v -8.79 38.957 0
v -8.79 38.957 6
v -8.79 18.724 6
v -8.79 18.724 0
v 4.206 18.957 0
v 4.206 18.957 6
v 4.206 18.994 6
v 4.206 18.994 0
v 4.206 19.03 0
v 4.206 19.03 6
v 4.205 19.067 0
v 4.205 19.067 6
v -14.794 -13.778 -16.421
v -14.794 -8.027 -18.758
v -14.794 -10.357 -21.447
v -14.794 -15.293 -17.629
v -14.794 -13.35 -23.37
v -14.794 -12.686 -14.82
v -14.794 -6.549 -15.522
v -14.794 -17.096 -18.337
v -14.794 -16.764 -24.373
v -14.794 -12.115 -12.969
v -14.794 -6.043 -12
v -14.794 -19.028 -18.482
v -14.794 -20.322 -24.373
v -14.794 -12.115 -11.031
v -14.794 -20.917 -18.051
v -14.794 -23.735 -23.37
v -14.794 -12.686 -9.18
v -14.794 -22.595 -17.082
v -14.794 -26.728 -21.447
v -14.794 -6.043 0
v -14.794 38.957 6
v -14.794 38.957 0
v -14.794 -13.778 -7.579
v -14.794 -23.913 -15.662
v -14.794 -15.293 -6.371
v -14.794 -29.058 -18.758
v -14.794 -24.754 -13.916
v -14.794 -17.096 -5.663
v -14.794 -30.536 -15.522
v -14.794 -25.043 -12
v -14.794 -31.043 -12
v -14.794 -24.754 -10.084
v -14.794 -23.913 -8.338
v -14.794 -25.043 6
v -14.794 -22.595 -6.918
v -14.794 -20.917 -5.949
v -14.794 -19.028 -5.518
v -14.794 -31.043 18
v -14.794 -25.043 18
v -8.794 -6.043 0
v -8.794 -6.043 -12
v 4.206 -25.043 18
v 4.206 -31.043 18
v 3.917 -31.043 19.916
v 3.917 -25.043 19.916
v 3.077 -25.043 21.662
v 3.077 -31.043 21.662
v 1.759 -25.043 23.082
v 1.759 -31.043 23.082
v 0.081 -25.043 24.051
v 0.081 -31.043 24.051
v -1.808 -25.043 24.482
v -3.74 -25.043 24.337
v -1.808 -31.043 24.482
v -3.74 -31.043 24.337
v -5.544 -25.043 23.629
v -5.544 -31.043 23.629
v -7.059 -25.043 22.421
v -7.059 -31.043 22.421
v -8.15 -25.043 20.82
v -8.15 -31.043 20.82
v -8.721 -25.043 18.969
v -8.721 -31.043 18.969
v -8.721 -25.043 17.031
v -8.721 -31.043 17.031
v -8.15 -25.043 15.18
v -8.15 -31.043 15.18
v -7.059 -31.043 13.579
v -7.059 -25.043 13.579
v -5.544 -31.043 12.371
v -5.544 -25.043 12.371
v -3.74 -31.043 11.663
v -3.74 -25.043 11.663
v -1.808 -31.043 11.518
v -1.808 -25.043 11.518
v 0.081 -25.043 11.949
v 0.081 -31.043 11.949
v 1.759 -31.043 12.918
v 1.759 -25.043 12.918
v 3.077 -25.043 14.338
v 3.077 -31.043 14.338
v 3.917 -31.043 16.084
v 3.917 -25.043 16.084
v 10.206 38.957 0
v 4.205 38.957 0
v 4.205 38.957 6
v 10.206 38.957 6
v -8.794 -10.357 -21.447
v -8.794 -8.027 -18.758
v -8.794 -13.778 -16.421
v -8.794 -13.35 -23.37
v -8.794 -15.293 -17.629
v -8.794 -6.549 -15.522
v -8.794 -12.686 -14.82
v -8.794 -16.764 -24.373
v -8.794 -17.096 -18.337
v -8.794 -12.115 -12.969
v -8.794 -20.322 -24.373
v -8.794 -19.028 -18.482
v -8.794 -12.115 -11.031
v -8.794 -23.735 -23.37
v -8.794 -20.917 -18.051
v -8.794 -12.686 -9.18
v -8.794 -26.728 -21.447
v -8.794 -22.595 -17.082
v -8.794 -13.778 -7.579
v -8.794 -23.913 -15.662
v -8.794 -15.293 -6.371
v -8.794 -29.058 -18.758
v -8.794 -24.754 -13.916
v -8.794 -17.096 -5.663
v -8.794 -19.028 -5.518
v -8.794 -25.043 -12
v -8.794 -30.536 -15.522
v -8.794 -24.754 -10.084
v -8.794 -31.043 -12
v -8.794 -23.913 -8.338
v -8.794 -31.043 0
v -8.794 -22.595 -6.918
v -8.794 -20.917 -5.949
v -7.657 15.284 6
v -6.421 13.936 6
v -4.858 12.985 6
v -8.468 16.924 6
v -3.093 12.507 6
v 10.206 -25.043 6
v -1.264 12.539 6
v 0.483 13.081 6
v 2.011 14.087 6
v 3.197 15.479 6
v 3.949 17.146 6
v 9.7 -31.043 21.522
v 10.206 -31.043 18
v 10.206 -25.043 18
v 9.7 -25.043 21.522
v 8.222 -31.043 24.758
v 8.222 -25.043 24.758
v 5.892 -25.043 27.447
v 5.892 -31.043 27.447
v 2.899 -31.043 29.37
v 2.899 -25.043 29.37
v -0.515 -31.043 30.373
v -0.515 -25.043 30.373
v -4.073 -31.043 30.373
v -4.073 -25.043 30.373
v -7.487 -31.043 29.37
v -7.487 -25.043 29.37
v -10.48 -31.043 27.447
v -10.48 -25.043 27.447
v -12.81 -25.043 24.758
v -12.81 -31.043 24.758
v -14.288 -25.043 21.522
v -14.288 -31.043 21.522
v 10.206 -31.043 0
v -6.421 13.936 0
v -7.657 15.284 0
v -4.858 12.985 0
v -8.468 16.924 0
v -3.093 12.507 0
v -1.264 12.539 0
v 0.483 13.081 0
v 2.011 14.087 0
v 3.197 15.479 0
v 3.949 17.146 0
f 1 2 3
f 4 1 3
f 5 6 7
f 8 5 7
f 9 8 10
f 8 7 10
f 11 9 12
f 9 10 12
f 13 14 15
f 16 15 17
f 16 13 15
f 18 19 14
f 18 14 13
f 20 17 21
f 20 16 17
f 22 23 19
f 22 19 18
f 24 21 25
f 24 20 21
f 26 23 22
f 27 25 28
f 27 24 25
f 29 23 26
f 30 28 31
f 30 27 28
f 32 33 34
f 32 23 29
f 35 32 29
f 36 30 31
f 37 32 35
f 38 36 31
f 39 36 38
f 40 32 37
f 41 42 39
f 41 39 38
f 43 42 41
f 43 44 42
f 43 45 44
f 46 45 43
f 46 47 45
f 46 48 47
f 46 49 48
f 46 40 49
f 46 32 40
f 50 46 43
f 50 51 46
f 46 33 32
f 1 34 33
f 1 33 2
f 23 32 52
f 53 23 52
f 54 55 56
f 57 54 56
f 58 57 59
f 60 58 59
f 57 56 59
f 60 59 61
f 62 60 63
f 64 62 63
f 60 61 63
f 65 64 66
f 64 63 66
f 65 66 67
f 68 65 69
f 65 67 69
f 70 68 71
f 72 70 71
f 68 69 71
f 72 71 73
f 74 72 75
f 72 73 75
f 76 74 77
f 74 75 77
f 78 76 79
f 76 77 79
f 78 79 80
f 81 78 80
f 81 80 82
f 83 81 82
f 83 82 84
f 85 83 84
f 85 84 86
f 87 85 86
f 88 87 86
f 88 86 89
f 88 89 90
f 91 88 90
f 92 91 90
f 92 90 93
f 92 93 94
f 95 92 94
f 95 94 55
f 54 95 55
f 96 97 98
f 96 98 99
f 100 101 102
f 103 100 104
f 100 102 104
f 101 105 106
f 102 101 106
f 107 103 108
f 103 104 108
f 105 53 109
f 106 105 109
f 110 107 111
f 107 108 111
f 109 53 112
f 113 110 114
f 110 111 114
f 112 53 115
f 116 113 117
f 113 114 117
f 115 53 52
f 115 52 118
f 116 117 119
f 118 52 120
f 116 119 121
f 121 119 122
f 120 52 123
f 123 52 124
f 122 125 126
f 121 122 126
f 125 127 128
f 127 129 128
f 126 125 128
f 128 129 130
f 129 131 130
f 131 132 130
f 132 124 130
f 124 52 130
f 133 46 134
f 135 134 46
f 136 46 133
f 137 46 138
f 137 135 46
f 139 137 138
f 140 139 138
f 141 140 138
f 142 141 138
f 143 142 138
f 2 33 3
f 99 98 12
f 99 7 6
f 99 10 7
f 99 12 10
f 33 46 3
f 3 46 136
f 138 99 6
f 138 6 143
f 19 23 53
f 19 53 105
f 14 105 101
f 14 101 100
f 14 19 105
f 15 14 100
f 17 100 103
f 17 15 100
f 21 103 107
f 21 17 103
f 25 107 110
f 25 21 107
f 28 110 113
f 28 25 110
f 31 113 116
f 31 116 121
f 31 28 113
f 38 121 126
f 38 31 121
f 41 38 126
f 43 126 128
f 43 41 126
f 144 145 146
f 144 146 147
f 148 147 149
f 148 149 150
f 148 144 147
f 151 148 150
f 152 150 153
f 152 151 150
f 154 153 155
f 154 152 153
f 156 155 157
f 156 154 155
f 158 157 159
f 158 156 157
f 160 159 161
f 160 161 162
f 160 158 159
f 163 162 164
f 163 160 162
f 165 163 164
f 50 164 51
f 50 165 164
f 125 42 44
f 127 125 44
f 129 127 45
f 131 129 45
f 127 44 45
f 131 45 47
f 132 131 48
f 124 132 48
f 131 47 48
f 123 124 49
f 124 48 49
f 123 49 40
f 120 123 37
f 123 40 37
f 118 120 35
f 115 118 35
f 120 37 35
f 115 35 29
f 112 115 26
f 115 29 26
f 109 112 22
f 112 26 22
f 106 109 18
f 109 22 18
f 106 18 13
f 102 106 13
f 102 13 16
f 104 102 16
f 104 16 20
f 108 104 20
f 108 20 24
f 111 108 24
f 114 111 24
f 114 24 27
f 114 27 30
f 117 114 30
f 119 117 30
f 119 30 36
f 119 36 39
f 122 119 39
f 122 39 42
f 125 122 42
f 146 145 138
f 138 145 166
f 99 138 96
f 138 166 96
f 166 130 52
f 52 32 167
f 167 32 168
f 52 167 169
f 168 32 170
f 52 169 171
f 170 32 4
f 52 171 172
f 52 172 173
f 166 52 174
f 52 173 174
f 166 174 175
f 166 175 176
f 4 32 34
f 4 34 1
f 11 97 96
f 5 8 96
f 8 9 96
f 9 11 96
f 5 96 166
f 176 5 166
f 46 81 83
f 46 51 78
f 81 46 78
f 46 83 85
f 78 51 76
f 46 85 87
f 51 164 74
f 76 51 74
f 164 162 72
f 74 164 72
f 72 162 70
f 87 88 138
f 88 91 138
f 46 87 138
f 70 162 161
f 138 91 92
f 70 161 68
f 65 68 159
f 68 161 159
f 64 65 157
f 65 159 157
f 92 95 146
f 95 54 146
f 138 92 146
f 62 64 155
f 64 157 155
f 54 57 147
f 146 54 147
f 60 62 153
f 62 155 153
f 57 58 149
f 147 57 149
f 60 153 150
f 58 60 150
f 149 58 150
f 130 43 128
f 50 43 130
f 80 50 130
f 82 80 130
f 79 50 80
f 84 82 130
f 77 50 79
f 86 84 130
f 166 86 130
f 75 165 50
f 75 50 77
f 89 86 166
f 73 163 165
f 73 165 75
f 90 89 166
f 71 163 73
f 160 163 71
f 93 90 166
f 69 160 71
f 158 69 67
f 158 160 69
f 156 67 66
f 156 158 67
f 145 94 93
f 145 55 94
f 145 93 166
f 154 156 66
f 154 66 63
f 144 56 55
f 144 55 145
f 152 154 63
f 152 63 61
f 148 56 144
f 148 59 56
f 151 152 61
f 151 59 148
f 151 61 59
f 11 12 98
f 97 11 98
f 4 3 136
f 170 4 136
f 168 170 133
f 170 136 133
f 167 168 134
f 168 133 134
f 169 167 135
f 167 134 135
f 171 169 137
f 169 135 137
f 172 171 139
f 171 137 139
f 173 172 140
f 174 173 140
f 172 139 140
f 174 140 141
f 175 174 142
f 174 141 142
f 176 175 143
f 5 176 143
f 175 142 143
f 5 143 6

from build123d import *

# Parameters (mm, degrees)
F0_W      = 25
F0_H      = 70
F1_DEPTH  = 6
F2_W      = 25
F2_H      = 6
F3_DEPTH  = 12
F5_DEPTH  = 6
F6_R      = 6.5
F7_DEPTH  = 25
F9_DEPTH  = 25
F10_W     = 6
F10_H     = 25
F11_DEPTH = 12
F13_DEPTH = 6
F14_R     = 6.5
F15_DEPTH = 25


with BuildPart() as f1:
    # F0 (on Top) → F1 (new body)
    with BuildSketch(Plane.XY):
        with Locations((-2.293949775, 3.9573735297)):
            Rectangle(F0_W, F0_H)
    extrude(amount=F1_DEPTH)

    # F2 (on face) → F3 (join)
    with BuildSketch(Plane.XY.offset(6)):
        with Locations((-2.293949775, -28.0426264703)):
            Rectangle(F2_W, F2_H)
    extrude(amount=F3_DEPTH)

    # F4 (on face) → F5 (join)
    with BuildSketch(Plane.XZ.offset(31.0426264703)):
        with BuildLine():
            Line((-14.793949775, 18), (10.206050225, 18))
            ThreePointArc((10.206050225, 18), (-2.293949775, 30.5), (-14.793949775, 18))
        make_face()
    extrude(amount=-F5_DEPTH)

    # F6 (on face) → F7 (cut)
    with BuildSketch(Plane.XZ.offset(31.0426264703)):
        with Locations((-2.293949775, 18)):
            Circle(F6_R)
    extrude(amount=-F7_DEPTH, mode=Mode.SUBTRACT)

    # F8 (on face) → F9 (cut)
    with BuildSketch(Plane.XY.offset(6)):
        with BuildLine():
            ThreePointArc((-8.7897636486, 18.7241309105), (-2.1773096843, 12.4584201455), (4.206050225, 18.9573735297))
            ThreePointArc((4.206050225, 18.9573735297), (4.2058200655, 19.0120728966), (4.2051296032, 19.0667683897))
            ThreePointArc((4.2051296032, 19.0667683897), (-2.2320043737, 25.4570783512), (-8.7897636486, 19.1906161489))
            Line((-8.7897636486, 19.1906161489), (-8.7897636486, 18.7241309105))
        make_face()
        with BuildLine():
            ThreePointArc((-8.7897636486, 19.1906161489), (-2.2320043737, 25.4570783512), (4.2051296032, 19.0667683897))
            Line((4.2051296032, 19.0667683897), (4.2051296032, 38.9573735297))
            Line((4.2051296032, 38.9573735297), (-8.7897636486, 38.9573735297))
            Line((-8.7897636486, 38.9573735297), (-8.7897636486, 19.1906161489))
        make_face()
    extrude(amount=-F9_DEPTH, mode=Mode.SUBTRACT)

    # F10 (on face) → F11 (join)
    with BuildSketch(Plane(origin=(0, 0, 0), x_dir=(1, 0, 0), z_dir=(0, 0, -1))):
        with Locations((-11.793949775, 18.5426264703)):
            Rectangle(F10_W, F10_H)
    extrude(amount=F11_DEPTH)

    # F12 (on face) → F13 (join)
    with BuildSketch(Plane(origin=(-14.793949775, 0, 0), x_dir=(0, -1, 0), z_dir=(-1, 0, 0))):
        with BuildLine():
            ThreePointArc((6.0426264703, -12), (18.5426264703, -24.5), (31.0426264703, -12))
            Line((31.0426264703, -12), (6.0426264703, -12))
        make_face()
    extrude(amount=-F13_DEPTH)

    # F14 (on face) → F15 (cut)
    with BuildSketch(Plane(origin=(-14.793949775, 0, 0), x_dir=(0, -1, 0), z_dir=(-1, 0, 0))):
        with Locations((18.5426264703, -12)):
            Circle(F14_R)
    extrude(amount=-F15_DEPTH, mode=Mode.SUBTRACT)


solid = f1.part
